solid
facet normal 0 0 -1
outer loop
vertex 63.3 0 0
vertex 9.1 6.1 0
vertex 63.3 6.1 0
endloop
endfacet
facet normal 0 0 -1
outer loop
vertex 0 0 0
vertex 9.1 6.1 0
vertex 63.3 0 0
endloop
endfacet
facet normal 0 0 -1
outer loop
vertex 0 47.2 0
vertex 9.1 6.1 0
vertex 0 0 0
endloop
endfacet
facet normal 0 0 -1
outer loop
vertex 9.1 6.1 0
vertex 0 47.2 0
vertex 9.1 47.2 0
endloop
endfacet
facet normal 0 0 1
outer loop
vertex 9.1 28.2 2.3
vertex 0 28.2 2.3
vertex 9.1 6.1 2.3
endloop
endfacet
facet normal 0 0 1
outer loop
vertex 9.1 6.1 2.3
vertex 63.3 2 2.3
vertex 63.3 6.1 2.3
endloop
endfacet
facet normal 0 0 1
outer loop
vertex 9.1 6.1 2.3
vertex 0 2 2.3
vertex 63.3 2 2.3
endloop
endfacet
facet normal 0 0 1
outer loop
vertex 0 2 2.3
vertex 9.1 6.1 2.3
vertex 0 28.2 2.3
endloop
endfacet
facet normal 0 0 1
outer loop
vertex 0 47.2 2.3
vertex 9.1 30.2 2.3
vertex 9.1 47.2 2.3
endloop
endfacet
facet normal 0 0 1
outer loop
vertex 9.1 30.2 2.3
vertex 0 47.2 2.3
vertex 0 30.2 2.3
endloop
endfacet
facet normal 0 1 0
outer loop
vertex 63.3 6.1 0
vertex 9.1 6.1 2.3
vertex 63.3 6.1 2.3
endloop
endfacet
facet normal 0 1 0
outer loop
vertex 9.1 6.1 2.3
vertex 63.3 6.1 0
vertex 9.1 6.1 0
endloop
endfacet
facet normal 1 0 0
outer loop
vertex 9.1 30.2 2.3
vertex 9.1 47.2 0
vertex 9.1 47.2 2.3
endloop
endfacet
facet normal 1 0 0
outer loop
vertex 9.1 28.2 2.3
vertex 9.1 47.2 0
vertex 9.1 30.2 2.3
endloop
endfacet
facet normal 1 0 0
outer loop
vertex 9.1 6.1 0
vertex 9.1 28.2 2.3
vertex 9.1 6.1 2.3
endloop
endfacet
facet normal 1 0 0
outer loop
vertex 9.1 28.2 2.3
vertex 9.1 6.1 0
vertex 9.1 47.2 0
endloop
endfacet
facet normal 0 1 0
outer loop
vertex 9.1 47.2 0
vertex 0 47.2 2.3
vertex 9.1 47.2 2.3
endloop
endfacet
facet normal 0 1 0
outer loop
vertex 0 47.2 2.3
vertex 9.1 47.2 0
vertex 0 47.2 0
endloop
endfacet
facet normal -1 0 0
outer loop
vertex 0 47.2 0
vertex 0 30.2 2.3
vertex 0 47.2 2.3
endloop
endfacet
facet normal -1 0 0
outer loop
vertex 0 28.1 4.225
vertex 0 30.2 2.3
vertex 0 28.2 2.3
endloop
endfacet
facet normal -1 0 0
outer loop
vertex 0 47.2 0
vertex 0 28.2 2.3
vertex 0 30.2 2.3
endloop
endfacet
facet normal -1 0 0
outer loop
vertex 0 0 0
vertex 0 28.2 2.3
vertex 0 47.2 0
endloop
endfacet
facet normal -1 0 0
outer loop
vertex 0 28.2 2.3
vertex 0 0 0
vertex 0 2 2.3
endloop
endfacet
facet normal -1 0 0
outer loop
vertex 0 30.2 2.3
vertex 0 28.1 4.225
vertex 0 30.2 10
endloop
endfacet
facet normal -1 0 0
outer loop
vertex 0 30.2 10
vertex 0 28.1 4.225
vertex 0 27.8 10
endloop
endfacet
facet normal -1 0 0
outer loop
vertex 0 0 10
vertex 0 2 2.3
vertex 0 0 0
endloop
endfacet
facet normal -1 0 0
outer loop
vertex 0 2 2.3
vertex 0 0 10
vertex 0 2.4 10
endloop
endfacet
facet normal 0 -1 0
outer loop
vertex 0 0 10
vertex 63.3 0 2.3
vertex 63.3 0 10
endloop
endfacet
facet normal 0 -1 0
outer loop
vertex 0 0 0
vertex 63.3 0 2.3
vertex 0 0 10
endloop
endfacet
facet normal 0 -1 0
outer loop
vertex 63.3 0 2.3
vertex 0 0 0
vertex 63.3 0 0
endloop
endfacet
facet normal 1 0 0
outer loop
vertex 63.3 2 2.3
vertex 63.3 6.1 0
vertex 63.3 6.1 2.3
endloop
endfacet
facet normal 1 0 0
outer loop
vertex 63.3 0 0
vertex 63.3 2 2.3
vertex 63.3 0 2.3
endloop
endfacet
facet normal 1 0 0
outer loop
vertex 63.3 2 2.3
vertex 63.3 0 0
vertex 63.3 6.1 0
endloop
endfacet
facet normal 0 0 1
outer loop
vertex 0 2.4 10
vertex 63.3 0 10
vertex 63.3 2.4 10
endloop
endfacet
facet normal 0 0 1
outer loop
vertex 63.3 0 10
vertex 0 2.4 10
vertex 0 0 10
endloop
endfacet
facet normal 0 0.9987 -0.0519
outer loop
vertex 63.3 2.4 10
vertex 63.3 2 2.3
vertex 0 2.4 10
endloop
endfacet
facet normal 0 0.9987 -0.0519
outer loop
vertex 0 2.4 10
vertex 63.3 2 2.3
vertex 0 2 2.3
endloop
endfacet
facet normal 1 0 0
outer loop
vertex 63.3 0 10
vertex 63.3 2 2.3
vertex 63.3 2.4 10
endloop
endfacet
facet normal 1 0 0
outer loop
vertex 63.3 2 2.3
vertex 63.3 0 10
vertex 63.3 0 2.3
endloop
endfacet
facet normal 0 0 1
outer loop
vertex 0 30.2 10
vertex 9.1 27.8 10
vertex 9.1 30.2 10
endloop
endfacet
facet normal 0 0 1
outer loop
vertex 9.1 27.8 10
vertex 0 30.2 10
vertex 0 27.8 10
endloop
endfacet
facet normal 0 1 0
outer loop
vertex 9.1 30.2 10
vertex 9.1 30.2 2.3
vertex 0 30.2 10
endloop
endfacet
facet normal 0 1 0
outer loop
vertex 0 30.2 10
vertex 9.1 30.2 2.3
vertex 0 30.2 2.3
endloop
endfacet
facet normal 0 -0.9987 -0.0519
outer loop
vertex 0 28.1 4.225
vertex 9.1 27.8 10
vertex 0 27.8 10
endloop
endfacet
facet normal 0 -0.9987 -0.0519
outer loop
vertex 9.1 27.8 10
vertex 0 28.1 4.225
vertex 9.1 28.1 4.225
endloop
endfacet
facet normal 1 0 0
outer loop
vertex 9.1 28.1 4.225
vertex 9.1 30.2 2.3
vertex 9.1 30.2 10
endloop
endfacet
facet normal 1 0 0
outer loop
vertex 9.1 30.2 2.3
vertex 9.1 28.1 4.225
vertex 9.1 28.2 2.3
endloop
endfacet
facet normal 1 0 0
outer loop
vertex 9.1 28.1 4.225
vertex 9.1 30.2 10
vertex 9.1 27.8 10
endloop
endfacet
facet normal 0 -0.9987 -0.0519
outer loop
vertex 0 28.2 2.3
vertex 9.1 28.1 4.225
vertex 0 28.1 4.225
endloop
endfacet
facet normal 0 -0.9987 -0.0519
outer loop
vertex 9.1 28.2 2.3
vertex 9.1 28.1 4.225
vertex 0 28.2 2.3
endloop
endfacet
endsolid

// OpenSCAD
// file: flap_dimensions.scad
/*
   Copyright 2018 Scott Bezek and the splitflap contributors

   Licensed under the Apache License, Version 2.0 (the "License");
   you may not use this file except in compliance with the License.
   You may obtain a copy of the License at

       http://www.apache.org/licenses/LICENSE-2.0

   Unless required by applicable law or agreed to in writing, software
   distributed under the License is distributed on an "AS IS" BASIS,
   WITHOUT WARRANTIES OR CONDITIONS OF ANY KIND, either express or implied.
   See the License for the specific language governing permissions and
   limitations under the License.
*/

flap_width = 54;
flap_height = 43;
flap_thickness = 30 / 1000 * 25.4; // 30 mil
flap_corner_radius = 3.1; // 2.88-3.48mm (used just for display)

flap_pin_width = 1.4;
// main file
/*
   Copyright 2018 Scott Bezek and the splitflap contributors

   Licensed under the Apache License, Version 2.0 (the "License");
   you may not use this file except in compliance with the License.
   You may obtain a copy of the License at

       http://www.apache.org/licenses/LICENSE-2.0

   Unless required by applicable law or agreed to in writing, software
   distributed under the License is distributed on an "AS IS" BASIS,
   WITHOUT WARRANTIES OR CONDITIONS OF ANY KIND, either express or implied.
   See the License for the specific language governing permissions and
   limitations under the License.
*/

include<flap_dimensions.scad>;

print_tolerance = 0.1;
jig_thickness = 2;

clamp_inset = 0.4;

punch_width = 26;
punch_lower_height = 7.7;
punch_gap_height = 2.5;
slot_inset_depth = 9.3;
slot_depth = 3;
slot_width = 15;

eps = 0.1;

jig_length = flap_width + slot_inset_depth;

union() {
    linear_extrude(height=punch_gap_height - print_tolerance*2) {
        difference() {
            square([jig_length, jig_thickness*2 + print_tolerance*2 + flap_height]);
            translate([slot_inset_depth - print_tolerance*2, jig_thickness + print_tolerance + (punch_width - slot_width)/2 - flap_pin_width - print_tolerance]) {
                square([flap_width + slot_depth + print_tolerance*2 + eps, jig_thickness + print_tolerance + flap_height - (punch_width - slot_width)/2 + flap_pin_width + print_tolerance + eps]);
            }
        }
    }

    translate([0, 0, punch_gap_height - print_tolerance*2]) {
        linear_extrude(height=punch_lower_height, scale=[1, (jig_thickness + clamp_inset)/jig_thickness]) {
            square([jig_length, jig_thickness]);
        }
    }

    translate([0, jig_thickness*2 + print_tolerance*2 + punch_width, punch_gap_height - print_tolerance*2]) {
        linear_extrude(height=punch_lower_height, scale=[1, (jig_thickness + clamp_inset)/jig_thickness]) {
            translate([0, -jig_thickness]) {
                square([slot_inset_depth - print_tolerance*2, jig_thickness]);
            }
        }
    }
}


%translate([slot_inset_depth, jig_thickness + print_tolerance + (punch_width - slot_width)/2, -8]) {
    cube([slot_depth, slot_width, 16]);
}
